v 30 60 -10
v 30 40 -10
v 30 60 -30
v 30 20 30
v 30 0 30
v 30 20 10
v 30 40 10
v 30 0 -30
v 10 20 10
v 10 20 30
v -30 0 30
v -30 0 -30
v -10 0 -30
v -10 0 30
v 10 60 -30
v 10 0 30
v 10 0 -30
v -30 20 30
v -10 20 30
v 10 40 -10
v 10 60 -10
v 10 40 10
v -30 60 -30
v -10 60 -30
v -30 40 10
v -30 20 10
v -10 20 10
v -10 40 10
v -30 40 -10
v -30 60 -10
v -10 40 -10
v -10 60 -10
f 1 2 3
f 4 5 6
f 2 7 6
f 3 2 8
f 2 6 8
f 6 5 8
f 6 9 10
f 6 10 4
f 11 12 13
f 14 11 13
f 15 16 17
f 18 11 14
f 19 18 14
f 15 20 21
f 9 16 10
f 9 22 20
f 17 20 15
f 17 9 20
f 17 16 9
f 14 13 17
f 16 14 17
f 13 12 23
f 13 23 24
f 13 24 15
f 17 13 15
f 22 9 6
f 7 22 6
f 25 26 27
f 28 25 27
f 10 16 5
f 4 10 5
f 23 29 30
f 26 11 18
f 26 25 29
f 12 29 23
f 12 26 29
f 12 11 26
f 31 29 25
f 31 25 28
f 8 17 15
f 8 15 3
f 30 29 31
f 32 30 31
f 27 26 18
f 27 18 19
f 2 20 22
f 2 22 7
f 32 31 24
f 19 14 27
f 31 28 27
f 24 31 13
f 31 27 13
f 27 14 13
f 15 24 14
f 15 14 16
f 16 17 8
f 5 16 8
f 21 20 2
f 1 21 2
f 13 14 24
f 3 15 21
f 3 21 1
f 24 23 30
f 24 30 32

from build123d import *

# Parameters (mm, degrees)
CROQUIS1_W                = 20
CROQUIS1_H                = 60
SALIENTE_EXTRUIR1_DEPTH   = 20
SALIENTE_EXTRUIR1_2_DEPTH = 20
CROQUIS2_W                = 20
CROQUIS2_H                = 40
SALIENTE_EXTRUIR2_DEPTH   = 20
CROQUIS3_W                = 20
CROQUIS3_H                = 20
SALIENTE_EXTRUIR3_DEPTH   = 20
CROQUIS4_W                = 20
CROQUIS4_H                = 60
SALIENTE_EXTRUIR9_DEPTH   = 60
CHAFL_N1_SIZE             = 60


with BuildPart() as part:
    # Croquis1 → Saliente-Extruir1 (new body)
    with BuildSketch(Plane(origin=(0, 0, 0), x_dir=(1, 0, 0), z_dir=(0, 1, 0))):
        with Locations((20, 0)):
            Rectangle(CROQUIS1_W, CROQUIS1_H)
    extrude(amount=SALIENTE_EXTRUIR1_DEPTH)



with BuildPart() as body_2:
    # Croquis1 → Saliente-Extruir1 2 (new body)
    with BuildSketch(Plane(origin=(0, 0, 0), x_dir=(1, 0, 0), z_dir=(0, 1, 0))):
        with Locations((-20, 0)):
            Rectangle(CROQUIS1_W, CROQUIS1_H)
    extrude(amount=SALIENTE_EXTRUIR1_2_DEPTH)


with BuildPart() as part_1:
    add(part.part)

    add(body_2.part)  # Saliente-Extruir2 merges body 2
    # Croquis2 → Saliente-Extruir2 (add)
    with BuildSketch(Plane(origin=(0, 20, 0), x_dir=(1, 0, 0), z_dir=(0, 1, 0))):
        with Locations((20, 10)):
            Rectangle(CROQUIS2_W, CROQUIS2_H)
        with Locations((-20, 10)):
            Rectangle(CROQUIS2_W, CROQUIS2_H)
    extrude(amount=SALIENTE_EXTRUIR2_DEPTH)

    # Croquis3 → Saliente-Extruir3 (add)
    with BuildSketch(Plane(origin=(0, 40, 0), x_dir=(1, 0, 0), z_dir=(0, 1, 0))):
        with Locations((20, 20)):
            Rectangle(CROQUIS3_W, CROQUIS3_H)
        with Locations((-20, 20)):
            Rectangle(CROQUIS3_W, CROQUIS3_H)
    extrude(amount=SALIENTE_EXTRUIR3_DEPTH)


with BuildPart() as body_2_2:
    # Croquis4 → Saliente-Extruir9 (new body)
    with BuildSketch(Plane(origin=(0, 60, 0), x_dir=(1, 0, 0), z_dir=(0, 1, 0))):
        Rectangle(CROQUIS4_W, CROQUIS4_H)
    extrude(amount=-SALIENTE_EXTRUIR9_DEPTH)

    # Chaflán1
    chafl_n1_edges = [body_2_2.edges().sort_by_distance(p)[0] for p in [
        (0, 60, 30),
    ]]
    chamfer(chafl_n1_edges, length=CHAFL_N1_SIZE - 0.0001)  # a hair under: the kernel refuses the full size


solid = Compound([part_1.part, body_2_2.part])
